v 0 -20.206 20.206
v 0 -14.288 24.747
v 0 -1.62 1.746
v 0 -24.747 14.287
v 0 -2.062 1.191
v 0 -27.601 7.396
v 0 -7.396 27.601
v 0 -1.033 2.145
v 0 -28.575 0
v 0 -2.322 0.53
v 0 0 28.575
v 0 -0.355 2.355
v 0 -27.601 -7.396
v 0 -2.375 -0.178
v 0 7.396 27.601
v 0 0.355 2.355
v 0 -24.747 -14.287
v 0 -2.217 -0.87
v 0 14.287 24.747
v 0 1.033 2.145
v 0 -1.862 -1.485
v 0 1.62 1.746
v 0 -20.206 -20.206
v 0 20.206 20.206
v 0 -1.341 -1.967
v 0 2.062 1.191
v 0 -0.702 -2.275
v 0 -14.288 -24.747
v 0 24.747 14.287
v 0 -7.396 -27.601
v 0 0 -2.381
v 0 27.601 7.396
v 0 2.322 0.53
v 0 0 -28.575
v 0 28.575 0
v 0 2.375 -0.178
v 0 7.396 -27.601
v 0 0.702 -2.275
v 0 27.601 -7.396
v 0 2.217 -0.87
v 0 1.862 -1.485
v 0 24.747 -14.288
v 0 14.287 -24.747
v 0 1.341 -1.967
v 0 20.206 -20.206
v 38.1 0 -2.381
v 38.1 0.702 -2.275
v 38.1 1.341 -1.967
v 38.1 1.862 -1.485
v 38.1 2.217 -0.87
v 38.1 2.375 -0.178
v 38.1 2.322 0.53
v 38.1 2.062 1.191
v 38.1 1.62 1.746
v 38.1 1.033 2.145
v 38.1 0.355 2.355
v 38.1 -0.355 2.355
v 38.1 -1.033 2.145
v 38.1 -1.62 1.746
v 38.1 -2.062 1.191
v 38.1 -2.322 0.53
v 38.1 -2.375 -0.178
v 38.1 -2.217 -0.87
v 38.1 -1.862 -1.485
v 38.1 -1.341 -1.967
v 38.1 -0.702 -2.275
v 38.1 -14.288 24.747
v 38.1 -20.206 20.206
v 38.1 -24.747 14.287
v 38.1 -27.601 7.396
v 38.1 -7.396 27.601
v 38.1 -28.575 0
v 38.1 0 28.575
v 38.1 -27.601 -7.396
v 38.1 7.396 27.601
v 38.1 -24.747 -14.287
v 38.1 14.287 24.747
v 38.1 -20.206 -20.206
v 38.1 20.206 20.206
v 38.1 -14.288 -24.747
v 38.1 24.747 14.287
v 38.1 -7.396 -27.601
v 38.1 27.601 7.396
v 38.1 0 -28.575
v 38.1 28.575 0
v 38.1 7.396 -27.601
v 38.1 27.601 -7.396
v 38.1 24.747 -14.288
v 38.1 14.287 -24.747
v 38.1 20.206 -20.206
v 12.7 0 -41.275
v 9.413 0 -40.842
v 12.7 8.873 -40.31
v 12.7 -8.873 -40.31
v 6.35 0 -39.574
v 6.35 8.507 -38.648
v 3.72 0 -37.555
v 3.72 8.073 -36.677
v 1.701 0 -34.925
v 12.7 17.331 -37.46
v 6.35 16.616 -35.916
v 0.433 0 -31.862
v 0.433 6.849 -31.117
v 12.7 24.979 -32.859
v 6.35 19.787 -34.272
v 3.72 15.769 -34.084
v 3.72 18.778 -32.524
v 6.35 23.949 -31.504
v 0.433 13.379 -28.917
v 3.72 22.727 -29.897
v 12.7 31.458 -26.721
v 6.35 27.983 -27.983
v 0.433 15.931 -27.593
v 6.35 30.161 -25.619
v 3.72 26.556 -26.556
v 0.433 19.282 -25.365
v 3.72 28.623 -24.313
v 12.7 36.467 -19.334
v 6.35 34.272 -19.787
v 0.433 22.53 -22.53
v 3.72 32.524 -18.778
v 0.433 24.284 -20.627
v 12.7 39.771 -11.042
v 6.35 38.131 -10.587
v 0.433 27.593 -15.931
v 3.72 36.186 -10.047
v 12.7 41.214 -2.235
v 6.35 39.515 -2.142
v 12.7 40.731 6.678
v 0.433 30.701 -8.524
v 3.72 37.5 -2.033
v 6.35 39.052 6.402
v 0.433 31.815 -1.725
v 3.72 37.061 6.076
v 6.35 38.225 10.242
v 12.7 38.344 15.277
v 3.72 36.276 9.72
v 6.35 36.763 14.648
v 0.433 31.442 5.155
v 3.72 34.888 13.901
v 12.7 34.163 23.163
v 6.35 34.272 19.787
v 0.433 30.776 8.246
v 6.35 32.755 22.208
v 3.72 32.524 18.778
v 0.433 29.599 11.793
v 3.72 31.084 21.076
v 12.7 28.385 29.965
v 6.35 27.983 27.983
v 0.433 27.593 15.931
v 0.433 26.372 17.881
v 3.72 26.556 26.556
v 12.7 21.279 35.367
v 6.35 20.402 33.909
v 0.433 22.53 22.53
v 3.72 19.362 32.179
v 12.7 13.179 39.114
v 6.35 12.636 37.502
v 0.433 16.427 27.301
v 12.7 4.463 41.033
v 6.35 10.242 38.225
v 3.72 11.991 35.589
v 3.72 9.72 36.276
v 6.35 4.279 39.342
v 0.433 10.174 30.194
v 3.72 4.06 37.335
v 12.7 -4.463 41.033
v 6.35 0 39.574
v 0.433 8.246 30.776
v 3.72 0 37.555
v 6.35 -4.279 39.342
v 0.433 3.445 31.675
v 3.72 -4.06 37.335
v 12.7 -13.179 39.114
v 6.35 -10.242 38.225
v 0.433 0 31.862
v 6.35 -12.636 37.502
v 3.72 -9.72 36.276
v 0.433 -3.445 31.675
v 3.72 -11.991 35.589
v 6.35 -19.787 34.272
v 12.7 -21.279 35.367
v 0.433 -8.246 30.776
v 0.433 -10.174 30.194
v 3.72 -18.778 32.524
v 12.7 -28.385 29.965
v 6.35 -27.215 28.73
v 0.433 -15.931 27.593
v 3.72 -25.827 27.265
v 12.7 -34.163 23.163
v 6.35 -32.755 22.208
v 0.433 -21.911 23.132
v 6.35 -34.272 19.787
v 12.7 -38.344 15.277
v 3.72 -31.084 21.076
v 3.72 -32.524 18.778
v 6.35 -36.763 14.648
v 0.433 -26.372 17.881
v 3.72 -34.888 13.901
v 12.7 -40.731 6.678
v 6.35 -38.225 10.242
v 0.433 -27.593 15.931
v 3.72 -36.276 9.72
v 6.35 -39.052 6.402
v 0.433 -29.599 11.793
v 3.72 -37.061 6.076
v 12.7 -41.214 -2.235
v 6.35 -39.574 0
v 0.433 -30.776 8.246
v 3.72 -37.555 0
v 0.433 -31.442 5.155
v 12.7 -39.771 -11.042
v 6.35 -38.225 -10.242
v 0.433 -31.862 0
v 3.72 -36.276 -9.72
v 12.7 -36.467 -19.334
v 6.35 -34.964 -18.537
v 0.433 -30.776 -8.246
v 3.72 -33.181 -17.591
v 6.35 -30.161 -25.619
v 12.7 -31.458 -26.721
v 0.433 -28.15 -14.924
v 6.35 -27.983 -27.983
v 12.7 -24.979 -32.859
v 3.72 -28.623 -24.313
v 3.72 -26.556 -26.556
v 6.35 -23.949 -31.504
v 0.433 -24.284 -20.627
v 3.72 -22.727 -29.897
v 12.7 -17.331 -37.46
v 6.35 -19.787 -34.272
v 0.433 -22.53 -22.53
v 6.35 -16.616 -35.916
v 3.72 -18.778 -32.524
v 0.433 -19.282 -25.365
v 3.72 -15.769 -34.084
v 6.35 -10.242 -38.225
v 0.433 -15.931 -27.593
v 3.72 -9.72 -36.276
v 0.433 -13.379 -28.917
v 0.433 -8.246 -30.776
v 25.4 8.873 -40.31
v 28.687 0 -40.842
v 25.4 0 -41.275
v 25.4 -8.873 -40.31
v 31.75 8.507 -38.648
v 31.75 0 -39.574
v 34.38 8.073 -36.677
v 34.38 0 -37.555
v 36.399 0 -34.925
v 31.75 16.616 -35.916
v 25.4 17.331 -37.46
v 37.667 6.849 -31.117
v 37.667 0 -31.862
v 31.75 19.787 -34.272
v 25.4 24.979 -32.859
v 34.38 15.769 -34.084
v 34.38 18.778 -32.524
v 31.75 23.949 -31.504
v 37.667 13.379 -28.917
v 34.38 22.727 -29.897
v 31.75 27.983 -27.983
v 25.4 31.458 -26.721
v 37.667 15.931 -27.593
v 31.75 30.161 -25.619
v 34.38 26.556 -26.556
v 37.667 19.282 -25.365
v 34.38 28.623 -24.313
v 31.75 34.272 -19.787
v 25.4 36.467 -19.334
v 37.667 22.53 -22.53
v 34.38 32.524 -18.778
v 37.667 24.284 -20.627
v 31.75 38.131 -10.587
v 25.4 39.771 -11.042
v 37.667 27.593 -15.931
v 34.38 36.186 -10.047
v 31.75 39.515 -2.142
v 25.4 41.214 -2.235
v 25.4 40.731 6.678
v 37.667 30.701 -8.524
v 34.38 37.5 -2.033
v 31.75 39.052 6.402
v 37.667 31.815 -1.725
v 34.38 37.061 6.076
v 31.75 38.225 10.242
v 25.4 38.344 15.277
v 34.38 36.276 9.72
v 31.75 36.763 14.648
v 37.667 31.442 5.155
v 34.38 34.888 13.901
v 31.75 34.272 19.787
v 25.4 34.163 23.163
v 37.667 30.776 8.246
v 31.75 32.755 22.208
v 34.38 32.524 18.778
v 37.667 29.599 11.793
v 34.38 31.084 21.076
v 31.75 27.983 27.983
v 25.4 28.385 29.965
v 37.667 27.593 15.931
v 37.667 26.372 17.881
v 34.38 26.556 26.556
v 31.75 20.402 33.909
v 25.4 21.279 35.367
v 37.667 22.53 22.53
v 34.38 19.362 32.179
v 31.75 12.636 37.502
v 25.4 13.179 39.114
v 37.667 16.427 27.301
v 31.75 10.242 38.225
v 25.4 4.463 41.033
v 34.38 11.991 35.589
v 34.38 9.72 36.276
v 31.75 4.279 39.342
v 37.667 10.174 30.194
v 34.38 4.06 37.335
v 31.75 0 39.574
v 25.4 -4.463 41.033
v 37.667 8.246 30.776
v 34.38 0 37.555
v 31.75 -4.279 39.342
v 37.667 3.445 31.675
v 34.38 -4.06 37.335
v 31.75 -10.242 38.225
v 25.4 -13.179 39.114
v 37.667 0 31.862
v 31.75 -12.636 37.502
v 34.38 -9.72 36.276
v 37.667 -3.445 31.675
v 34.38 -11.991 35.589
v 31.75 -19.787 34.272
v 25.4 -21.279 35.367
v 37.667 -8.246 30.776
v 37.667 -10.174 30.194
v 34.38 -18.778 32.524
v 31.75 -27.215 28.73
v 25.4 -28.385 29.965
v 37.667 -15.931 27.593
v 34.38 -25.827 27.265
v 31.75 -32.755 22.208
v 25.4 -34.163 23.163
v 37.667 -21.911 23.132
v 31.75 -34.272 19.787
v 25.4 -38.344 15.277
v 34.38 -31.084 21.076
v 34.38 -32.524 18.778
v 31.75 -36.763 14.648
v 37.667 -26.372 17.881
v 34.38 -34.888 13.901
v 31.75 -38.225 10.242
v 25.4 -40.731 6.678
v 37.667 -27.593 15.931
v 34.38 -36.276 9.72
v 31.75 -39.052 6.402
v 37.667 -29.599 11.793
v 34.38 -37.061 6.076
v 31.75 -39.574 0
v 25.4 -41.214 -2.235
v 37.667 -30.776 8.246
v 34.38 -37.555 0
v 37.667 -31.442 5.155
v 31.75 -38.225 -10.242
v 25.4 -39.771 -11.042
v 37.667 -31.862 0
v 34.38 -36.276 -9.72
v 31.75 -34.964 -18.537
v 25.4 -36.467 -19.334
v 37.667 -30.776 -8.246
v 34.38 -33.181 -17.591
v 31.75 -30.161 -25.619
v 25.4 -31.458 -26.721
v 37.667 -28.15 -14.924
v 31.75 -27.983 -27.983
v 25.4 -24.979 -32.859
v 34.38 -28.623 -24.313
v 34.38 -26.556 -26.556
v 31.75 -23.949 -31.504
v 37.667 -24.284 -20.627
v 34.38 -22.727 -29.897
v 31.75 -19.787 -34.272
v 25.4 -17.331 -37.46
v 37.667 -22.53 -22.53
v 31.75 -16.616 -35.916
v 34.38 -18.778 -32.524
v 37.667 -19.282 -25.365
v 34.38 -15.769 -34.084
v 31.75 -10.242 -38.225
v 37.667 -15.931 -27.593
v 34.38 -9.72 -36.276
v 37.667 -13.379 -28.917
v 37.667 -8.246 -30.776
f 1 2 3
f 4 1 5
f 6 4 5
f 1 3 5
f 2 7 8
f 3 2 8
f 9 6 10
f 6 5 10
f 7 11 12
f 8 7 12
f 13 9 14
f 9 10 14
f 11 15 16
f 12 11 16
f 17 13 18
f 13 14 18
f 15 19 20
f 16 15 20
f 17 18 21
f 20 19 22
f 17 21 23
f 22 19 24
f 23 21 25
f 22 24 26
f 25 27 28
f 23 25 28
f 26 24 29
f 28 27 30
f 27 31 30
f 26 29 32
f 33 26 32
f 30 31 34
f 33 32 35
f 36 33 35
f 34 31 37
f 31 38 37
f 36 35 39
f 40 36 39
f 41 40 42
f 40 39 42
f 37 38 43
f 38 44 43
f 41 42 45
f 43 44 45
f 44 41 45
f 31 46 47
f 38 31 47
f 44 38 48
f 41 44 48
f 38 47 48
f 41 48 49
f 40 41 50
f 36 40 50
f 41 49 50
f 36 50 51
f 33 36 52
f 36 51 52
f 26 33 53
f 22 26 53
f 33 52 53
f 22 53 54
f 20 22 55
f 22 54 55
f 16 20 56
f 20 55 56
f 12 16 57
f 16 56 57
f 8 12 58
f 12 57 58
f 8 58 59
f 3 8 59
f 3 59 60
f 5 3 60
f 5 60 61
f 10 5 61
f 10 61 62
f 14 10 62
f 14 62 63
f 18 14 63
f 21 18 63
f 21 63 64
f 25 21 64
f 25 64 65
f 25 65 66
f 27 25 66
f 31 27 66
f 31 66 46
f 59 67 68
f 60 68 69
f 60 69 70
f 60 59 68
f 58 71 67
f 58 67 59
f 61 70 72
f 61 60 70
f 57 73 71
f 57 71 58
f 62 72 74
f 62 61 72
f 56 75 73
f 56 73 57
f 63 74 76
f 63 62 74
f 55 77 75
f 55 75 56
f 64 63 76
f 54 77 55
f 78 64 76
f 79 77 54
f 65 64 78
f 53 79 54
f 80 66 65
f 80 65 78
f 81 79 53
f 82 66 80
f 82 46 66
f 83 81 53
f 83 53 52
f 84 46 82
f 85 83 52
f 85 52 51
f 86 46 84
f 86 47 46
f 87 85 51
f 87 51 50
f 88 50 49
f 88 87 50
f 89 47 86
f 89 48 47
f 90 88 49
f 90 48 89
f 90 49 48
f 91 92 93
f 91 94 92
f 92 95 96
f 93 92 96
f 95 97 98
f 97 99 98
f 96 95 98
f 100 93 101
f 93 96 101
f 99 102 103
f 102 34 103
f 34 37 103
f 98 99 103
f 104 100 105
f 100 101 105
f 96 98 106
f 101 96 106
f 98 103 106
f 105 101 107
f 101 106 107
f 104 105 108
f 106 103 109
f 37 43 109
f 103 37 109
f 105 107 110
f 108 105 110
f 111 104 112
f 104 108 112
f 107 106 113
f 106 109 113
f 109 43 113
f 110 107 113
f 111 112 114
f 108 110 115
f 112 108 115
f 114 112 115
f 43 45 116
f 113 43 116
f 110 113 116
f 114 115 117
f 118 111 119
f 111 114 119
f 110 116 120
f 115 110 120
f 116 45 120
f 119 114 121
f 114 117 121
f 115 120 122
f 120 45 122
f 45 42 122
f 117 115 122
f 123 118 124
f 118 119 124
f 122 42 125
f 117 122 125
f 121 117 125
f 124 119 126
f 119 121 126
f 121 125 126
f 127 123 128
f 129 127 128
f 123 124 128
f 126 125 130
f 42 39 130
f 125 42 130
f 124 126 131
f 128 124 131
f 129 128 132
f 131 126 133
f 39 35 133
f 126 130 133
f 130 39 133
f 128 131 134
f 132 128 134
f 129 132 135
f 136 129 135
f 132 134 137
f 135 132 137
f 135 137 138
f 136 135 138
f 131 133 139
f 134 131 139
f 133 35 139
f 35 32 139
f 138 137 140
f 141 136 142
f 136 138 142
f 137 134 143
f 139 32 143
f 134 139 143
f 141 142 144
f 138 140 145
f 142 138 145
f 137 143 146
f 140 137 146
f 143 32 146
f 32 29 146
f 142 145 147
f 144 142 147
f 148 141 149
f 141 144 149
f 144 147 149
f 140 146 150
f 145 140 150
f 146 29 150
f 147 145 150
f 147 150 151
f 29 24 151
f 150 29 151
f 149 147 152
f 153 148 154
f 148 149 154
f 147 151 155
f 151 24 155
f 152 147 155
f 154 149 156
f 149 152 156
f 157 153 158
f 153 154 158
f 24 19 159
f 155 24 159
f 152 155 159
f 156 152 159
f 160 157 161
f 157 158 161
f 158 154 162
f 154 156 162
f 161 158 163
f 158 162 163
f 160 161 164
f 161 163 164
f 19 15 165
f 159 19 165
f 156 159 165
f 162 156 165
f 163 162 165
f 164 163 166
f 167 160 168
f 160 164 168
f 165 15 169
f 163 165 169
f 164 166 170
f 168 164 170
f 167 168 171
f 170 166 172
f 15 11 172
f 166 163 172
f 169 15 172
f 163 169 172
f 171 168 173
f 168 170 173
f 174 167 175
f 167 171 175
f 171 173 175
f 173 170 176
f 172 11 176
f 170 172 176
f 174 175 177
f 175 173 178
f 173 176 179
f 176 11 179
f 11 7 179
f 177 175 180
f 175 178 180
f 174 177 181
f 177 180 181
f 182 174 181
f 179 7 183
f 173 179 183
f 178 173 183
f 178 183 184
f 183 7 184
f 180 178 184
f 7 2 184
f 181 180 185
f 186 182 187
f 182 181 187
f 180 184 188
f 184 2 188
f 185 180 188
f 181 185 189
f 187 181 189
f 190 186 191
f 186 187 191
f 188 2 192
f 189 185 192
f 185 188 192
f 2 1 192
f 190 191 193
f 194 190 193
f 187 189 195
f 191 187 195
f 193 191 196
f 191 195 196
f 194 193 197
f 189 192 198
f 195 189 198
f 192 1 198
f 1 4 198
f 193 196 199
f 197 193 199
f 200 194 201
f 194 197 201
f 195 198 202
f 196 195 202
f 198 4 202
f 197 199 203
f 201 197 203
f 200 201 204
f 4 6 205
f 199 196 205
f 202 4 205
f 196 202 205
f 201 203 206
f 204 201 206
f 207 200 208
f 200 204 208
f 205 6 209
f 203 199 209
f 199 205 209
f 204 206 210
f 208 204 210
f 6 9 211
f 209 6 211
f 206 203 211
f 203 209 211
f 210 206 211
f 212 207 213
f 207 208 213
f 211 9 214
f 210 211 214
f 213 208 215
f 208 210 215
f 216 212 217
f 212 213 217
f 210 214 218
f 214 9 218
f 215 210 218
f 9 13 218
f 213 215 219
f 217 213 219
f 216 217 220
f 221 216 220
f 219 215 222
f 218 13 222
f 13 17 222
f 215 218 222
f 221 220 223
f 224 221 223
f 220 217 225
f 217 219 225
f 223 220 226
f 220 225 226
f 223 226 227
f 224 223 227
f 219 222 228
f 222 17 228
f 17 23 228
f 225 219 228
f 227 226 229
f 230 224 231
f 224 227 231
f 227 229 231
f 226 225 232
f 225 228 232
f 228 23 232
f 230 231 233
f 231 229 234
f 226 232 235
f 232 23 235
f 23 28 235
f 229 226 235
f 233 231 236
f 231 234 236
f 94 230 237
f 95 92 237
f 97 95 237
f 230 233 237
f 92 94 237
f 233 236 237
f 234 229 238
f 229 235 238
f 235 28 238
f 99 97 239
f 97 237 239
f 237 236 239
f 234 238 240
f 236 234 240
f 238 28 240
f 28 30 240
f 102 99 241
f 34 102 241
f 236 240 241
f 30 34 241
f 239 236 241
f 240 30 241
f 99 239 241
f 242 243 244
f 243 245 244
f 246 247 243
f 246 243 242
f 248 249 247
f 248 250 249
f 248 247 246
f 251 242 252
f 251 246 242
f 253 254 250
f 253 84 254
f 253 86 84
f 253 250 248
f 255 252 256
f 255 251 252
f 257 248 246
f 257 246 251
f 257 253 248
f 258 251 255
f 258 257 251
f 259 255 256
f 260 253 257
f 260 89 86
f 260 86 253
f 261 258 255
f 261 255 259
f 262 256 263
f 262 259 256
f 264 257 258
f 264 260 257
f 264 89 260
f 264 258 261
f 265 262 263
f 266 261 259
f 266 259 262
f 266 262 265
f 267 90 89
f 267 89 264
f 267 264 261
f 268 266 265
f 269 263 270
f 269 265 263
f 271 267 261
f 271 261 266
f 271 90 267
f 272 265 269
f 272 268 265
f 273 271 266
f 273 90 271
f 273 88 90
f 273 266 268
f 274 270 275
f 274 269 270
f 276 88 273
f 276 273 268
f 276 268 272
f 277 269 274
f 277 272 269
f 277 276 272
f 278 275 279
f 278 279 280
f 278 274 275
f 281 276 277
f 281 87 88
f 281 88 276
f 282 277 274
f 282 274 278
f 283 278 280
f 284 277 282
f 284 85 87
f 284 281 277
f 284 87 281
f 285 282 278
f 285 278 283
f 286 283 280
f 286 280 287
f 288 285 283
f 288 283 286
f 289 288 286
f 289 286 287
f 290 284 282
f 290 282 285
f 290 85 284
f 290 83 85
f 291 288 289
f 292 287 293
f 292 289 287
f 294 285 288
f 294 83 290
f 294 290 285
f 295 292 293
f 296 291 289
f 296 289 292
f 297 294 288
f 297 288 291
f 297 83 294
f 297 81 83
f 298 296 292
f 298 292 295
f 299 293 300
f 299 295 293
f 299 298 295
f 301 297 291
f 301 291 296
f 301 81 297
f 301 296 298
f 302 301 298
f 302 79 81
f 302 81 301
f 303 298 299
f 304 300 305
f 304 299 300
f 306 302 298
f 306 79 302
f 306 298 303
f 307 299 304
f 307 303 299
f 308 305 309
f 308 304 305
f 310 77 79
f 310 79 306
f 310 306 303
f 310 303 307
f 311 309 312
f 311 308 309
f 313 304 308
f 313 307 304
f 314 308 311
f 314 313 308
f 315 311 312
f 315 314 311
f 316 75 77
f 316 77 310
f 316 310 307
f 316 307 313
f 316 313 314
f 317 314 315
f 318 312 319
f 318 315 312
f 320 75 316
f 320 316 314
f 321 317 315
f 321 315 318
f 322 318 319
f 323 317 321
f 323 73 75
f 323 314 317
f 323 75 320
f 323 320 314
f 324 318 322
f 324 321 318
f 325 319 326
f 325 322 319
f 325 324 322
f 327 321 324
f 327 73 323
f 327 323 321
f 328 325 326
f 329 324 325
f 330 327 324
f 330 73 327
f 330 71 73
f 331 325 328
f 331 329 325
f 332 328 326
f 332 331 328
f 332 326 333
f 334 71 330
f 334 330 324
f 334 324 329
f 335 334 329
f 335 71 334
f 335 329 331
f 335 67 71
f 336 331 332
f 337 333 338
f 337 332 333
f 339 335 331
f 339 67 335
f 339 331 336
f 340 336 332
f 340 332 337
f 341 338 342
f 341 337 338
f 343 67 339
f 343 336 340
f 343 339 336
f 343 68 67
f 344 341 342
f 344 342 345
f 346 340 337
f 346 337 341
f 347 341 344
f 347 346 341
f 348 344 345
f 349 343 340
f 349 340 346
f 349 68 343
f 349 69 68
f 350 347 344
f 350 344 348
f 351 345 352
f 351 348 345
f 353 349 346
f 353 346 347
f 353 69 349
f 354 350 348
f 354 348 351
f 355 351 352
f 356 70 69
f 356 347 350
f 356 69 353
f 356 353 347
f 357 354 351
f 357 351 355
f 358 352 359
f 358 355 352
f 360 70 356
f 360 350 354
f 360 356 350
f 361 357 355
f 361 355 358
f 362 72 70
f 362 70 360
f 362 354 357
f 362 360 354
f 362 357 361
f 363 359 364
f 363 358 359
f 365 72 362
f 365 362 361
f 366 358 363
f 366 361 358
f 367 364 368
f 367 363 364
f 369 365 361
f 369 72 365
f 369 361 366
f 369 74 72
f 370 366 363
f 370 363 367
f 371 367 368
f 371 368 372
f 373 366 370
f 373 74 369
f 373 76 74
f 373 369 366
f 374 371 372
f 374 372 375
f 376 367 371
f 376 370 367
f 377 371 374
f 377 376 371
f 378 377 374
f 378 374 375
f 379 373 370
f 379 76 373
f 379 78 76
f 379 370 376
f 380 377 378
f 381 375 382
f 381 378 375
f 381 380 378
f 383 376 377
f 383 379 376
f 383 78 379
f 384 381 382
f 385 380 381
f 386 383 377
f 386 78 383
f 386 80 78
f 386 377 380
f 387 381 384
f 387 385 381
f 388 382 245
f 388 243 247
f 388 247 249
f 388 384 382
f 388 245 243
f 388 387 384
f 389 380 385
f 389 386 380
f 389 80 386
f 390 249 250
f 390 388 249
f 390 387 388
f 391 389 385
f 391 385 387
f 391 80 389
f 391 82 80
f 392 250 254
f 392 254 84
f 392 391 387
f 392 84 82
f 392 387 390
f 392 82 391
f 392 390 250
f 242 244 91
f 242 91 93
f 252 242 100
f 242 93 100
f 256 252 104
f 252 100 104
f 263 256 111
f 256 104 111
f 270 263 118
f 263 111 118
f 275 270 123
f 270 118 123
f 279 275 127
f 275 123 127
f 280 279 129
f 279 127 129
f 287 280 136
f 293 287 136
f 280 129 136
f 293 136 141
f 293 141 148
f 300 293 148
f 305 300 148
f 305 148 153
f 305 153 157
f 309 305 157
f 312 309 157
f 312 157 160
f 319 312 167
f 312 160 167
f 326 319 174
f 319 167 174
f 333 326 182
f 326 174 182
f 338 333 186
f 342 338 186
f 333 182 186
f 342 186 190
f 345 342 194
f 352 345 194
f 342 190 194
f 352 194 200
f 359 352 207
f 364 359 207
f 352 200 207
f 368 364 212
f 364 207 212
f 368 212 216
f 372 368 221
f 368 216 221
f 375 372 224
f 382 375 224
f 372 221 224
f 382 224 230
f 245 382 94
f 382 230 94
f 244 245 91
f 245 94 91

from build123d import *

# Parameters (mm, degrees)
SKETCH1_R           = 41.275
BOSS_EXTRUDE1_DEPTH = 38.1
SKETCH2_R           = 2.38125
CUT_EXTRUDE1_DEPTH  = 39.1
FILLET1_R           = 12.7


with BuildPart() as part:
    # Sketch1 → Boss-Extrude1 (new body)
    with BuildSketch(Plane(origin=(0, 0, 0), x_dir=(0, 0, -1), z_dir=(1, 0, 0))):
        Circle(SKETCH1_R)
    extrude(amount=BOSS_EXTRUDE1_DEPTH)

    # Sketch2 → Cut-Extrude1 (cut, through all)
    with BuildSketch(Plane(origin=(38.1, 0, 0), x_dir=(0, 0, -1), z_dir=(1, 0, 0))):
        Circle(SKETCH2_R)
    extrude(amount=-CUT_EXTRUDE1_DEPTH, mode=Mode.SUBTRACT)

    # Fillet1
    fillet1_edges = [part.edges().sort_by_distance(p)[0] for p in [
        (0, 0, 41.275),
        (38.1, 0, 41.275),
    ]]
    fillet(fillet1_edges, radius=FILLET1_R)


solid = part.part
